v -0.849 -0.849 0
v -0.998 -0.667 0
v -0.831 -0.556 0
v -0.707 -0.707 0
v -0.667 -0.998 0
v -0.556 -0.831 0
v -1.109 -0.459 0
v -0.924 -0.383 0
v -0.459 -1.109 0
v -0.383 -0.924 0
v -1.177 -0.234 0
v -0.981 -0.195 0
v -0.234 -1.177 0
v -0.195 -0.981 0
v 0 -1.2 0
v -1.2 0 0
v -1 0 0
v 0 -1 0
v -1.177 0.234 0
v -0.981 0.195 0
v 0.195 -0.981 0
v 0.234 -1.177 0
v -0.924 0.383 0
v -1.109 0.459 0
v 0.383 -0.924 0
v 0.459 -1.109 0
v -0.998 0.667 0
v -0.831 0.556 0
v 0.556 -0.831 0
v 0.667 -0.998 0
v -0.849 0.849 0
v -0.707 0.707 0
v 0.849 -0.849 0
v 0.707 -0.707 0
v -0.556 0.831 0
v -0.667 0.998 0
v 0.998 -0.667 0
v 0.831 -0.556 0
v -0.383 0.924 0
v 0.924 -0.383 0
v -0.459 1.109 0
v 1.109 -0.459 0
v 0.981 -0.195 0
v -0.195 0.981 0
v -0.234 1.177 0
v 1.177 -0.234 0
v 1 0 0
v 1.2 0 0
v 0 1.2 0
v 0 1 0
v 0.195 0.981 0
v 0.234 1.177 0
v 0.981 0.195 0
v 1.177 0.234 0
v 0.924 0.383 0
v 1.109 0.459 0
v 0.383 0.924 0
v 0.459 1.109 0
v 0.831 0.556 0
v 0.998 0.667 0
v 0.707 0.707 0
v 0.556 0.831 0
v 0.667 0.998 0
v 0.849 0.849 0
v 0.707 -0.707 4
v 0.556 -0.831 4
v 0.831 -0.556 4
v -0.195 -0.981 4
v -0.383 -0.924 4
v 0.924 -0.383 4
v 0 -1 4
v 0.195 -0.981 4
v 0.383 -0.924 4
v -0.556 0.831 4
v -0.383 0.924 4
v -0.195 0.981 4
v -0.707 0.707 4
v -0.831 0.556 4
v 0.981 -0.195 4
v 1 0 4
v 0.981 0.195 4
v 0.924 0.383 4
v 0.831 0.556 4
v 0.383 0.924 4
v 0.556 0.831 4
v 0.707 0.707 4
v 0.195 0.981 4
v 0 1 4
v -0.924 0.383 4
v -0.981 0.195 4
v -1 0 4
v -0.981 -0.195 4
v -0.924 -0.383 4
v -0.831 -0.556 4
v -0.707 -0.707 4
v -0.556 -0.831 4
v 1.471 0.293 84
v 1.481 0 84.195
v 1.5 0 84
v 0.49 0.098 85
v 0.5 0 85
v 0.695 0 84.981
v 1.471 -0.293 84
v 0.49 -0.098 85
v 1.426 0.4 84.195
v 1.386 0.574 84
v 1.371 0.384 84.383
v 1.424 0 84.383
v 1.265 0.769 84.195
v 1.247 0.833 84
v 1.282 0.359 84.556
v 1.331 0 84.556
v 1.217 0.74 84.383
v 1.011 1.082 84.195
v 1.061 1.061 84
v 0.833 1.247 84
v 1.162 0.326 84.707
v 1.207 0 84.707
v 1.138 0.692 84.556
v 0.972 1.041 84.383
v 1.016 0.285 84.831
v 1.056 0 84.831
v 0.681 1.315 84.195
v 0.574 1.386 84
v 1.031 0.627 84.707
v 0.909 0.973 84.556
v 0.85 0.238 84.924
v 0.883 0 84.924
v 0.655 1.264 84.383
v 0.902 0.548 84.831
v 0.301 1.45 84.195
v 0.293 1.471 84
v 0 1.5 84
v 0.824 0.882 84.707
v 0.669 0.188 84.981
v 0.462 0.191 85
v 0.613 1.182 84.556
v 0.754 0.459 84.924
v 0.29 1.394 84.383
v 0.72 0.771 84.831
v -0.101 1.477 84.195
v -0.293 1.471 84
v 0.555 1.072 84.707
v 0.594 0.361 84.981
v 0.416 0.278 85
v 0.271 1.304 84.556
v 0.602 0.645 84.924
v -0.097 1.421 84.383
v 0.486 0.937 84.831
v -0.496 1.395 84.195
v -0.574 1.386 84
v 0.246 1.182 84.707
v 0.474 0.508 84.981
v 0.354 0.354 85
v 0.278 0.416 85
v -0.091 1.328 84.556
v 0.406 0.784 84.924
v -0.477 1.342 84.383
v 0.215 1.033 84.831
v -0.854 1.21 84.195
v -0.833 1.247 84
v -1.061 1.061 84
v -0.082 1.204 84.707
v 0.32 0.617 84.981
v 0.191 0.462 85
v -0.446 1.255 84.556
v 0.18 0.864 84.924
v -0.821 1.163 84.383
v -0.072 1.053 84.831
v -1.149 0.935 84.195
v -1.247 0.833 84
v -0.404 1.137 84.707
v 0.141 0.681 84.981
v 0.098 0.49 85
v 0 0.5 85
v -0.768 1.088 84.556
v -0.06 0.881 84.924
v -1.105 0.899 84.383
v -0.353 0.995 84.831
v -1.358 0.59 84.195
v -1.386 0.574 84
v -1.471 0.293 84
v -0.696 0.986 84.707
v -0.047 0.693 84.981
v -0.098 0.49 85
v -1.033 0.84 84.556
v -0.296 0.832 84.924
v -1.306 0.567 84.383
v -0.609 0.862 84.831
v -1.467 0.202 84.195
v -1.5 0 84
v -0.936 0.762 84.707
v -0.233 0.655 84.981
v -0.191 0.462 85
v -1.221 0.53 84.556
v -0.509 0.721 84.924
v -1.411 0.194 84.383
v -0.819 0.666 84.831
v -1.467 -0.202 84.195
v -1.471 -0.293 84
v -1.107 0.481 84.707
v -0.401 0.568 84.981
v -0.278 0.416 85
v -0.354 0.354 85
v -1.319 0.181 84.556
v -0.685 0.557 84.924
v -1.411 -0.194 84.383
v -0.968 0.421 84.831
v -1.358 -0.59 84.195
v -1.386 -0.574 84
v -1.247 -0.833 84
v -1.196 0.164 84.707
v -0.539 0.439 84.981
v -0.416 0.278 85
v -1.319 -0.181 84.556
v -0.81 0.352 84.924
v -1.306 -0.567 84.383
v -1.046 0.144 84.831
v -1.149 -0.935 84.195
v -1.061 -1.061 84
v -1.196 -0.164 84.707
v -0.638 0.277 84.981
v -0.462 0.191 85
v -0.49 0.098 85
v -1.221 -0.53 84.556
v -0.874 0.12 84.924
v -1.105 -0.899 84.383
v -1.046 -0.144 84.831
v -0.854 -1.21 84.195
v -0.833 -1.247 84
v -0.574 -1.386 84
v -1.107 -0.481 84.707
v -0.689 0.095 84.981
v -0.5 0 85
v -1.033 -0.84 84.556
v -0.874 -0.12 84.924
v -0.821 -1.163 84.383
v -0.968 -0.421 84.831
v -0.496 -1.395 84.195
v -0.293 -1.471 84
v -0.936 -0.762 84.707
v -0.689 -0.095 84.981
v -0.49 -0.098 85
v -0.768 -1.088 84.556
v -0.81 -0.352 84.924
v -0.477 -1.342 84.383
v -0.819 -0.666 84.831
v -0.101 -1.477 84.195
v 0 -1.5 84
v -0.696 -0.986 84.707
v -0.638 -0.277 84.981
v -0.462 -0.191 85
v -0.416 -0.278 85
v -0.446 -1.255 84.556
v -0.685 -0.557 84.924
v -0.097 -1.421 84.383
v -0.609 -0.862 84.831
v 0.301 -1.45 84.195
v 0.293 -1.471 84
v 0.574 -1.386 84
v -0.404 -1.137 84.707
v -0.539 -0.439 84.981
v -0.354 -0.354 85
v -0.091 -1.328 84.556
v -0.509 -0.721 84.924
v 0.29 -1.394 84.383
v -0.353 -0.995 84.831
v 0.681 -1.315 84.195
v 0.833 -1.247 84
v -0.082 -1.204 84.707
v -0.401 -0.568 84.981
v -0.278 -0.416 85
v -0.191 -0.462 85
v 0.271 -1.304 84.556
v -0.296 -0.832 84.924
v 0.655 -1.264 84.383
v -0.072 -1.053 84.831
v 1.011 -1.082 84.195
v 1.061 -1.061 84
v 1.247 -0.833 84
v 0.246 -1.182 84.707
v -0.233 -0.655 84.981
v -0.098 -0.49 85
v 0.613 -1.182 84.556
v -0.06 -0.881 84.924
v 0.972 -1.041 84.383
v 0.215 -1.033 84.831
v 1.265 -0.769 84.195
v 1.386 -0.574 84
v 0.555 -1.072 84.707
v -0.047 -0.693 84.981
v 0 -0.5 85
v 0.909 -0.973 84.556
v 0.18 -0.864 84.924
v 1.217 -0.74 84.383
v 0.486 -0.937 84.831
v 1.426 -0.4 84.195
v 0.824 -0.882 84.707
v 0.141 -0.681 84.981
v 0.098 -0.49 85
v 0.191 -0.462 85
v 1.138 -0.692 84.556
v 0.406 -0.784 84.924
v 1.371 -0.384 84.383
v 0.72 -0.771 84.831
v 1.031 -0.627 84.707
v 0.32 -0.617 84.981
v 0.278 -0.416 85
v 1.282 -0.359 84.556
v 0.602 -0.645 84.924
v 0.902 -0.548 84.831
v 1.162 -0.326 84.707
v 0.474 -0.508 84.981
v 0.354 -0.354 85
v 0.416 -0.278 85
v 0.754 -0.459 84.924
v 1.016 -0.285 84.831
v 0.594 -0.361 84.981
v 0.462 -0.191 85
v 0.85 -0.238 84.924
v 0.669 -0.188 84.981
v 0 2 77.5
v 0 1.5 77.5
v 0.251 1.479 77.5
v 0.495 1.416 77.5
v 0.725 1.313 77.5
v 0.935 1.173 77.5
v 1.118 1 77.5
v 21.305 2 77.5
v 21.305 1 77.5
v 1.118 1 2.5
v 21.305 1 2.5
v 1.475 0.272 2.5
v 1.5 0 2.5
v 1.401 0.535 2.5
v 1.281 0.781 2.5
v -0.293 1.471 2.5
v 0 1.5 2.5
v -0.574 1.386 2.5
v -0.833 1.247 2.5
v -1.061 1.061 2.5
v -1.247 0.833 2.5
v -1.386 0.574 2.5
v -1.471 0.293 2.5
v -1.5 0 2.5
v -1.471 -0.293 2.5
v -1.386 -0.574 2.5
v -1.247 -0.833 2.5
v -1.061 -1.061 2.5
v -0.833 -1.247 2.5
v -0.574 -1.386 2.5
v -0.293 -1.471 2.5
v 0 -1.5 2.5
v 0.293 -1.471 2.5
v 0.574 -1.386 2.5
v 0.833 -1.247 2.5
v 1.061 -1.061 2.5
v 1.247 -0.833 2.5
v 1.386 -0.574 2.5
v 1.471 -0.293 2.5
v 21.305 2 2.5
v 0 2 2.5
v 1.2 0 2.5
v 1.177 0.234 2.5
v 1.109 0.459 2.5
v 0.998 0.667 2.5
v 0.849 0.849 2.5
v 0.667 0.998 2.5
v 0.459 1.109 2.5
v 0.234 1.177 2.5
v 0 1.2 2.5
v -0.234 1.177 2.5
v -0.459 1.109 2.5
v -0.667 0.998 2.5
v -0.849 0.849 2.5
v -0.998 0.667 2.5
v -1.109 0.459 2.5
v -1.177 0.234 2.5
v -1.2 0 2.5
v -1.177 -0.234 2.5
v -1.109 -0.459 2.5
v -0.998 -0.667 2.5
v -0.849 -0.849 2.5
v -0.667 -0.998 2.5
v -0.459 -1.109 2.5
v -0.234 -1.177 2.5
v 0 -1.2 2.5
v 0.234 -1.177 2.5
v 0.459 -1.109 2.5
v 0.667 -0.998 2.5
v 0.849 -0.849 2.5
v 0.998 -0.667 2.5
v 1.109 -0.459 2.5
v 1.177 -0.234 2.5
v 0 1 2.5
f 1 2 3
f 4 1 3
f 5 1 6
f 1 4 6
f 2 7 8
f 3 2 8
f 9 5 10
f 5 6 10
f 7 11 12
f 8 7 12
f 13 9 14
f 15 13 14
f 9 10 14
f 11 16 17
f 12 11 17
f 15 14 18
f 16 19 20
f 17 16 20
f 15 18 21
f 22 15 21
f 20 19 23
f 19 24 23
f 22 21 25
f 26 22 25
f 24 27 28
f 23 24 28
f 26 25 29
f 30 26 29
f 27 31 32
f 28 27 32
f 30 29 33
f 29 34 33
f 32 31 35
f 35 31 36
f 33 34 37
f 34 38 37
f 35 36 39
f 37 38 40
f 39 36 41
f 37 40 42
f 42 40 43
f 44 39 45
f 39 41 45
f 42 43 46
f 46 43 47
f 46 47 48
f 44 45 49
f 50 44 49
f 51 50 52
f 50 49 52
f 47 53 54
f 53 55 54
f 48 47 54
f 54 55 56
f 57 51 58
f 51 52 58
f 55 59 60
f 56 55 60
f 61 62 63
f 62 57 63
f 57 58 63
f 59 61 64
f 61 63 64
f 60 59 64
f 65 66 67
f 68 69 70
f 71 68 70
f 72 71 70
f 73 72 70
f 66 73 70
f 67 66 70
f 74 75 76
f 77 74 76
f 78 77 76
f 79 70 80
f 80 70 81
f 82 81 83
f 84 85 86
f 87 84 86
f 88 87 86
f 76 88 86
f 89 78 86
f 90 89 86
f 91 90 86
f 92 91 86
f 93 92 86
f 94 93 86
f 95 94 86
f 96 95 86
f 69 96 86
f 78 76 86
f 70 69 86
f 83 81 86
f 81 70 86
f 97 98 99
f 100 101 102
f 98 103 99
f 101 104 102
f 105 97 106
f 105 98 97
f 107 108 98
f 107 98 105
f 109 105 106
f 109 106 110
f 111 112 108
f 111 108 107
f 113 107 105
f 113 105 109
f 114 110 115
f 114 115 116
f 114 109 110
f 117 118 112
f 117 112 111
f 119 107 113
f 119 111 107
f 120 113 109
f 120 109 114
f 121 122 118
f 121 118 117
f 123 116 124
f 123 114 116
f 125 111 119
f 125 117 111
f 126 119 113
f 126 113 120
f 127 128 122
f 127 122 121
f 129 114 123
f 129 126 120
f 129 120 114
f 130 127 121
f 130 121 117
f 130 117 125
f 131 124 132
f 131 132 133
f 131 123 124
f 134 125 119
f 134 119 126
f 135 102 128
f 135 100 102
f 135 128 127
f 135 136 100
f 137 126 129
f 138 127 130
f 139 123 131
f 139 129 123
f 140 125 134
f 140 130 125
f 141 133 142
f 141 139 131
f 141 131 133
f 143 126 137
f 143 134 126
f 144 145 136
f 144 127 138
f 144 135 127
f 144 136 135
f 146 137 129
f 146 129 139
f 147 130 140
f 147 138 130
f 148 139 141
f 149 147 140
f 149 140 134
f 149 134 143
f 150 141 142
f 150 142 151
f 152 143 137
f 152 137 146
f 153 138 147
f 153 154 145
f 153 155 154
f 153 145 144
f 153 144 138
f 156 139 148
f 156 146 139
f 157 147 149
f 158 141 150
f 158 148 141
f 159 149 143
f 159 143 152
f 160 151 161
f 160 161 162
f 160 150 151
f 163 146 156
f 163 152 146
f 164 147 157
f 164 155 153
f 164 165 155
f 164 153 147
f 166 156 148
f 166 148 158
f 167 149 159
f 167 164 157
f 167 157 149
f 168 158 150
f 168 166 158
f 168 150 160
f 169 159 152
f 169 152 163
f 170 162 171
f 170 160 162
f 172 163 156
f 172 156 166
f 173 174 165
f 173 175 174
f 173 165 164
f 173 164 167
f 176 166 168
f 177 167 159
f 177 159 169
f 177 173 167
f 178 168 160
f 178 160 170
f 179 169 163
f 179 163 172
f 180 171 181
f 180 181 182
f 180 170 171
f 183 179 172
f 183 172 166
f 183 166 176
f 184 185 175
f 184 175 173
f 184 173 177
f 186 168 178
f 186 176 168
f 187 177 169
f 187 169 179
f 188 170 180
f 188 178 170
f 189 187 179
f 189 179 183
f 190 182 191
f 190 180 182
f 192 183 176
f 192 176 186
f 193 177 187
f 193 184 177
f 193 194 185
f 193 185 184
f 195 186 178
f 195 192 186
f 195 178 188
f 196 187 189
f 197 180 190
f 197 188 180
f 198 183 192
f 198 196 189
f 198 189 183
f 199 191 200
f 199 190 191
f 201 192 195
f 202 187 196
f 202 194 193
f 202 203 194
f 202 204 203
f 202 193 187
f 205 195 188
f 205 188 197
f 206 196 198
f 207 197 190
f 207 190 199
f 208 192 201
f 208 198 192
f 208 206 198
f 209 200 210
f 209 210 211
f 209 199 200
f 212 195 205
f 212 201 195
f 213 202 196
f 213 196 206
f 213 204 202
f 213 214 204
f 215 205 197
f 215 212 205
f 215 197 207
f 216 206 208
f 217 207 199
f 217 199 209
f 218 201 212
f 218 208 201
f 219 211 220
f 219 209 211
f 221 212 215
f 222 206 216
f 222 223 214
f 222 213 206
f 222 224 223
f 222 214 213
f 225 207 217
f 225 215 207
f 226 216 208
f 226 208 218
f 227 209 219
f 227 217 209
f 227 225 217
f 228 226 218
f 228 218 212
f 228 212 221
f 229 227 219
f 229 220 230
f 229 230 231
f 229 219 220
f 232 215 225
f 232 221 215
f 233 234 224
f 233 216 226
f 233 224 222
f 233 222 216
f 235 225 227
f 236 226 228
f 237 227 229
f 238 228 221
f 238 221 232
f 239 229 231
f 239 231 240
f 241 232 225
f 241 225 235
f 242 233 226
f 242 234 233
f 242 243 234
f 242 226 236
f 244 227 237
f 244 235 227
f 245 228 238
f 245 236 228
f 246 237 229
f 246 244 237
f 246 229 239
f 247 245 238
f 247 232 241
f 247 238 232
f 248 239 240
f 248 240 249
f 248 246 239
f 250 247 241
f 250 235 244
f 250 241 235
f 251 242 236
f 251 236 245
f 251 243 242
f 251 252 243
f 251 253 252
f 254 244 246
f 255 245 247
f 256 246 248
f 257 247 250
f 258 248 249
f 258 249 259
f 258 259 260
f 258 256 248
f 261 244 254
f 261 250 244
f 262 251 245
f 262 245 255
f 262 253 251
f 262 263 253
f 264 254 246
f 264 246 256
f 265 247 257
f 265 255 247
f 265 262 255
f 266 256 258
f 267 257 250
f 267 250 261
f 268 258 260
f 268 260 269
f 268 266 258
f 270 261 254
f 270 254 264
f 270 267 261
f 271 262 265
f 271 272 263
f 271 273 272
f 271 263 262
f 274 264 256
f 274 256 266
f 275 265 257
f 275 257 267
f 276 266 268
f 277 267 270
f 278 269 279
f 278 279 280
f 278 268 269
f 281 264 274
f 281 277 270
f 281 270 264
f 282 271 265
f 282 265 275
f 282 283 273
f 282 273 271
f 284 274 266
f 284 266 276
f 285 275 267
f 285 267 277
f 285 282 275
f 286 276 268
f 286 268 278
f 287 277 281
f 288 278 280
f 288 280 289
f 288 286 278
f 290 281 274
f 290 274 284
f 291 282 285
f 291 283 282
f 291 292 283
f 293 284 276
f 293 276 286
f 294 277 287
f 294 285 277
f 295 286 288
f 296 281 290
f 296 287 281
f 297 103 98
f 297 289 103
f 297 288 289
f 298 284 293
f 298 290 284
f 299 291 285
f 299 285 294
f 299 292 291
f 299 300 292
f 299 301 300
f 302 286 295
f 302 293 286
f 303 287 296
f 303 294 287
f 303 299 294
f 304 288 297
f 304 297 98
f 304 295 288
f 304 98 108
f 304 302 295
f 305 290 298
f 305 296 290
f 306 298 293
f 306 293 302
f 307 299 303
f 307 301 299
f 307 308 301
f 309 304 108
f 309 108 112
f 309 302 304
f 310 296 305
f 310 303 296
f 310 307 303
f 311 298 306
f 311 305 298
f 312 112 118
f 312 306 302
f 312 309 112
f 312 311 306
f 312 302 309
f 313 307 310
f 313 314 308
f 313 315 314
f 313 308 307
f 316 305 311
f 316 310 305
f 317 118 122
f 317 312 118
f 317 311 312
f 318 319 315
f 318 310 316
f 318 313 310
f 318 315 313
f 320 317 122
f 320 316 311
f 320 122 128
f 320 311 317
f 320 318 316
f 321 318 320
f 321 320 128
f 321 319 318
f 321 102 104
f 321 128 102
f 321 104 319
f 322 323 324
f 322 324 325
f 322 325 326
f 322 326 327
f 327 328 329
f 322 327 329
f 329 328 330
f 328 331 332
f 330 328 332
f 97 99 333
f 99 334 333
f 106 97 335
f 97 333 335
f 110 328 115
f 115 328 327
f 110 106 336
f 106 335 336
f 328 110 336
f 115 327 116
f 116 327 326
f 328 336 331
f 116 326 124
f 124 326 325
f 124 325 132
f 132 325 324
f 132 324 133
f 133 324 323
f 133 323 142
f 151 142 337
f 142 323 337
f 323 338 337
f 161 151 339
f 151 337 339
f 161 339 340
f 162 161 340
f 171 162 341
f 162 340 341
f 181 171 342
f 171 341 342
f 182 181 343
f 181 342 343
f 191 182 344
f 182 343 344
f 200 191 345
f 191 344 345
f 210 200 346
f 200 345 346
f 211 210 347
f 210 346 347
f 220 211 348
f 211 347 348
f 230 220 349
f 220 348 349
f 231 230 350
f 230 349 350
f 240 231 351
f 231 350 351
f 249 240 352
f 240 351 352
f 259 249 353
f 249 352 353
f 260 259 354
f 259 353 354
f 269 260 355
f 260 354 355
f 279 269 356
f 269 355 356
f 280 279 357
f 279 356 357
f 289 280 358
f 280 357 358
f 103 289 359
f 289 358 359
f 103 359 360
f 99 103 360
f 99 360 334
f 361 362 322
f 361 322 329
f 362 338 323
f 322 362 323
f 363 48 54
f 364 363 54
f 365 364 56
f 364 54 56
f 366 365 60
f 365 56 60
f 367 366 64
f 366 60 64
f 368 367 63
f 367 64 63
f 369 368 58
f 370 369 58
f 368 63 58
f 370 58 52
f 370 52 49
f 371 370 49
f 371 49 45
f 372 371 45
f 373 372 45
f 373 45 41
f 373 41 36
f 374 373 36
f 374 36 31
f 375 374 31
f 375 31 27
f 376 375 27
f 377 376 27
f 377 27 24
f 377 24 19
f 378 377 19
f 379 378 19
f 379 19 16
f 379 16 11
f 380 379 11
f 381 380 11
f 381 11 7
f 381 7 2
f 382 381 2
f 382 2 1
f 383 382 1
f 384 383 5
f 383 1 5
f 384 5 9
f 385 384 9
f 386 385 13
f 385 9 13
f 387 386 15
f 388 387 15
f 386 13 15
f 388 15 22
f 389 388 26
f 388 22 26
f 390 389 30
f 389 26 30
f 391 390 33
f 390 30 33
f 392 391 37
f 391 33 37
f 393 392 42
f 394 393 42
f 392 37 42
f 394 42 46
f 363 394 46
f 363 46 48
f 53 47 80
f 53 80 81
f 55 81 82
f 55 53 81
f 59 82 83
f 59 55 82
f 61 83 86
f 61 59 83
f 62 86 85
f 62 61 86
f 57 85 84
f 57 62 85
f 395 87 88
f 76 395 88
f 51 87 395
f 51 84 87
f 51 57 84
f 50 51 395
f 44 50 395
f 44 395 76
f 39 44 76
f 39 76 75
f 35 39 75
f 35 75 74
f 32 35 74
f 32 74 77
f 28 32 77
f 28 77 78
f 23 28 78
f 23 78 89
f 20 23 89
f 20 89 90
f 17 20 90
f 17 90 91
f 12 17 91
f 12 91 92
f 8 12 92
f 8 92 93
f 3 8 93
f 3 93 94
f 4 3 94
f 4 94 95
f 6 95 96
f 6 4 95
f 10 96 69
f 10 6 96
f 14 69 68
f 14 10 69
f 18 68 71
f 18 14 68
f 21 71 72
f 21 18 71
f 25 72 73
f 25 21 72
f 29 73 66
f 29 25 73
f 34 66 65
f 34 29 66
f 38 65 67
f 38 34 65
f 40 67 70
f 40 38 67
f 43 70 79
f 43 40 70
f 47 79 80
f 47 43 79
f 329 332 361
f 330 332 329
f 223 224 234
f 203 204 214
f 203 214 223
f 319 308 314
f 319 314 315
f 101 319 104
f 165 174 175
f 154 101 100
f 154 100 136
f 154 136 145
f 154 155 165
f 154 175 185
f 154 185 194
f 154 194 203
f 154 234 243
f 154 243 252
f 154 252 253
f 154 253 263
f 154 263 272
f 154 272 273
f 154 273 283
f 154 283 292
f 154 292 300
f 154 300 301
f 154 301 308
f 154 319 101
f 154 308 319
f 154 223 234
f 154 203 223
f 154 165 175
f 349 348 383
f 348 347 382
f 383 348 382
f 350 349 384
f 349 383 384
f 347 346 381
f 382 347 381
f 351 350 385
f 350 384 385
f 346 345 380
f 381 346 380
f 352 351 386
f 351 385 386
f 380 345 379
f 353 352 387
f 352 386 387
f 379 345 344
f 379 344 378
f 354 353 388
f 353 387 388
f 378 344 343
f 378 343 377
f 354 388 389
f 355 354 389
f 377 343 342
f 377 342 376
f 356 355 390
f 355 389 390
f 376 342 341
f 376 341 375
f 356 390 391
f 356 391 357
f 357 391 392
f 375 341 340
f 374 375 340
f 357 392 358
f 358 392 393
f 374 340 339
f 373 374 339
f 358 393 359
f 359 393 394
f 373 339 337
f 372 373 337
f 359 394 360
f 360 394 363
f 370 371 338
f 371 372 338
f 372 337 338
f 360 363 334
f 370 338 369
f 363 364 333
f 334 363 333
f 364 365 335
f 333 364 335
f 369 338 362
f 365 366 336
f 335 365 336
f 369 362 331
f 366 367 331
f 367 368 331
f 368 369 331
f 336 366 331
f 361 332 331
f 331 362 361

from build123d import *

# Parameters (mm, degrees)
F0_R     = 1.5
F0_R_2   = 1.2
F0_R_3   = 1
F1_DEPTH = 85
F2_DEPTH = 2.5
F3_DEPTH = 4
F4_R     = 1
F6_START = -1
F5_W     = 21.3047601283
F5_H     = 75
F6_DEPTH = 1


with BuildPart() as f1:
    # F0 (on Top) → F1 (new body)
    with BuildSketch(Plane.XY):
        Circle(F0_R)
        Circle(F0_R_2, mode=Mode.SUBTRACT)
        Circle(F0_R_2)
        Circle(F0_R_3, mode=Mode.SUBTRACT)
        Circle(F0_R_3)
    extrude(amount=F1_DEPTH)

    # F0 (on Top) → F2 (cut)
    with BuildSketch(Plane.XY):
        Circle(F0_R)
        Circle(F0_R_2, mode=Mode.SUBTRACT)
    extrude(amount=F2_DEPTH, mode=Mode.SUBTRACT)

    # F0 (on Top) → F3 (cut)
    with BuildSketch(Plane.XY):
        Circle(F0_R_3)
    extrude(amount=F3_DEPTH, mode=Mode.SUBTRACT)

    # F4
    f4_edges = [f1.edges().sort_by_distance(p)[0] for p in [
        (-1.5, 0, 85),
    ]]
    fillet(f4_edges, radius=F4_R)

    # F5 (on Front) → F6 (join)
    with BuildSketch(Plane.XZ.offset(F6_START)):
        with Locations((10.6523800641, 40)):
            Rectangle(F5_W, F5_H)
    extrude(amount=-F6_DEPTH)


solid = f1.part
